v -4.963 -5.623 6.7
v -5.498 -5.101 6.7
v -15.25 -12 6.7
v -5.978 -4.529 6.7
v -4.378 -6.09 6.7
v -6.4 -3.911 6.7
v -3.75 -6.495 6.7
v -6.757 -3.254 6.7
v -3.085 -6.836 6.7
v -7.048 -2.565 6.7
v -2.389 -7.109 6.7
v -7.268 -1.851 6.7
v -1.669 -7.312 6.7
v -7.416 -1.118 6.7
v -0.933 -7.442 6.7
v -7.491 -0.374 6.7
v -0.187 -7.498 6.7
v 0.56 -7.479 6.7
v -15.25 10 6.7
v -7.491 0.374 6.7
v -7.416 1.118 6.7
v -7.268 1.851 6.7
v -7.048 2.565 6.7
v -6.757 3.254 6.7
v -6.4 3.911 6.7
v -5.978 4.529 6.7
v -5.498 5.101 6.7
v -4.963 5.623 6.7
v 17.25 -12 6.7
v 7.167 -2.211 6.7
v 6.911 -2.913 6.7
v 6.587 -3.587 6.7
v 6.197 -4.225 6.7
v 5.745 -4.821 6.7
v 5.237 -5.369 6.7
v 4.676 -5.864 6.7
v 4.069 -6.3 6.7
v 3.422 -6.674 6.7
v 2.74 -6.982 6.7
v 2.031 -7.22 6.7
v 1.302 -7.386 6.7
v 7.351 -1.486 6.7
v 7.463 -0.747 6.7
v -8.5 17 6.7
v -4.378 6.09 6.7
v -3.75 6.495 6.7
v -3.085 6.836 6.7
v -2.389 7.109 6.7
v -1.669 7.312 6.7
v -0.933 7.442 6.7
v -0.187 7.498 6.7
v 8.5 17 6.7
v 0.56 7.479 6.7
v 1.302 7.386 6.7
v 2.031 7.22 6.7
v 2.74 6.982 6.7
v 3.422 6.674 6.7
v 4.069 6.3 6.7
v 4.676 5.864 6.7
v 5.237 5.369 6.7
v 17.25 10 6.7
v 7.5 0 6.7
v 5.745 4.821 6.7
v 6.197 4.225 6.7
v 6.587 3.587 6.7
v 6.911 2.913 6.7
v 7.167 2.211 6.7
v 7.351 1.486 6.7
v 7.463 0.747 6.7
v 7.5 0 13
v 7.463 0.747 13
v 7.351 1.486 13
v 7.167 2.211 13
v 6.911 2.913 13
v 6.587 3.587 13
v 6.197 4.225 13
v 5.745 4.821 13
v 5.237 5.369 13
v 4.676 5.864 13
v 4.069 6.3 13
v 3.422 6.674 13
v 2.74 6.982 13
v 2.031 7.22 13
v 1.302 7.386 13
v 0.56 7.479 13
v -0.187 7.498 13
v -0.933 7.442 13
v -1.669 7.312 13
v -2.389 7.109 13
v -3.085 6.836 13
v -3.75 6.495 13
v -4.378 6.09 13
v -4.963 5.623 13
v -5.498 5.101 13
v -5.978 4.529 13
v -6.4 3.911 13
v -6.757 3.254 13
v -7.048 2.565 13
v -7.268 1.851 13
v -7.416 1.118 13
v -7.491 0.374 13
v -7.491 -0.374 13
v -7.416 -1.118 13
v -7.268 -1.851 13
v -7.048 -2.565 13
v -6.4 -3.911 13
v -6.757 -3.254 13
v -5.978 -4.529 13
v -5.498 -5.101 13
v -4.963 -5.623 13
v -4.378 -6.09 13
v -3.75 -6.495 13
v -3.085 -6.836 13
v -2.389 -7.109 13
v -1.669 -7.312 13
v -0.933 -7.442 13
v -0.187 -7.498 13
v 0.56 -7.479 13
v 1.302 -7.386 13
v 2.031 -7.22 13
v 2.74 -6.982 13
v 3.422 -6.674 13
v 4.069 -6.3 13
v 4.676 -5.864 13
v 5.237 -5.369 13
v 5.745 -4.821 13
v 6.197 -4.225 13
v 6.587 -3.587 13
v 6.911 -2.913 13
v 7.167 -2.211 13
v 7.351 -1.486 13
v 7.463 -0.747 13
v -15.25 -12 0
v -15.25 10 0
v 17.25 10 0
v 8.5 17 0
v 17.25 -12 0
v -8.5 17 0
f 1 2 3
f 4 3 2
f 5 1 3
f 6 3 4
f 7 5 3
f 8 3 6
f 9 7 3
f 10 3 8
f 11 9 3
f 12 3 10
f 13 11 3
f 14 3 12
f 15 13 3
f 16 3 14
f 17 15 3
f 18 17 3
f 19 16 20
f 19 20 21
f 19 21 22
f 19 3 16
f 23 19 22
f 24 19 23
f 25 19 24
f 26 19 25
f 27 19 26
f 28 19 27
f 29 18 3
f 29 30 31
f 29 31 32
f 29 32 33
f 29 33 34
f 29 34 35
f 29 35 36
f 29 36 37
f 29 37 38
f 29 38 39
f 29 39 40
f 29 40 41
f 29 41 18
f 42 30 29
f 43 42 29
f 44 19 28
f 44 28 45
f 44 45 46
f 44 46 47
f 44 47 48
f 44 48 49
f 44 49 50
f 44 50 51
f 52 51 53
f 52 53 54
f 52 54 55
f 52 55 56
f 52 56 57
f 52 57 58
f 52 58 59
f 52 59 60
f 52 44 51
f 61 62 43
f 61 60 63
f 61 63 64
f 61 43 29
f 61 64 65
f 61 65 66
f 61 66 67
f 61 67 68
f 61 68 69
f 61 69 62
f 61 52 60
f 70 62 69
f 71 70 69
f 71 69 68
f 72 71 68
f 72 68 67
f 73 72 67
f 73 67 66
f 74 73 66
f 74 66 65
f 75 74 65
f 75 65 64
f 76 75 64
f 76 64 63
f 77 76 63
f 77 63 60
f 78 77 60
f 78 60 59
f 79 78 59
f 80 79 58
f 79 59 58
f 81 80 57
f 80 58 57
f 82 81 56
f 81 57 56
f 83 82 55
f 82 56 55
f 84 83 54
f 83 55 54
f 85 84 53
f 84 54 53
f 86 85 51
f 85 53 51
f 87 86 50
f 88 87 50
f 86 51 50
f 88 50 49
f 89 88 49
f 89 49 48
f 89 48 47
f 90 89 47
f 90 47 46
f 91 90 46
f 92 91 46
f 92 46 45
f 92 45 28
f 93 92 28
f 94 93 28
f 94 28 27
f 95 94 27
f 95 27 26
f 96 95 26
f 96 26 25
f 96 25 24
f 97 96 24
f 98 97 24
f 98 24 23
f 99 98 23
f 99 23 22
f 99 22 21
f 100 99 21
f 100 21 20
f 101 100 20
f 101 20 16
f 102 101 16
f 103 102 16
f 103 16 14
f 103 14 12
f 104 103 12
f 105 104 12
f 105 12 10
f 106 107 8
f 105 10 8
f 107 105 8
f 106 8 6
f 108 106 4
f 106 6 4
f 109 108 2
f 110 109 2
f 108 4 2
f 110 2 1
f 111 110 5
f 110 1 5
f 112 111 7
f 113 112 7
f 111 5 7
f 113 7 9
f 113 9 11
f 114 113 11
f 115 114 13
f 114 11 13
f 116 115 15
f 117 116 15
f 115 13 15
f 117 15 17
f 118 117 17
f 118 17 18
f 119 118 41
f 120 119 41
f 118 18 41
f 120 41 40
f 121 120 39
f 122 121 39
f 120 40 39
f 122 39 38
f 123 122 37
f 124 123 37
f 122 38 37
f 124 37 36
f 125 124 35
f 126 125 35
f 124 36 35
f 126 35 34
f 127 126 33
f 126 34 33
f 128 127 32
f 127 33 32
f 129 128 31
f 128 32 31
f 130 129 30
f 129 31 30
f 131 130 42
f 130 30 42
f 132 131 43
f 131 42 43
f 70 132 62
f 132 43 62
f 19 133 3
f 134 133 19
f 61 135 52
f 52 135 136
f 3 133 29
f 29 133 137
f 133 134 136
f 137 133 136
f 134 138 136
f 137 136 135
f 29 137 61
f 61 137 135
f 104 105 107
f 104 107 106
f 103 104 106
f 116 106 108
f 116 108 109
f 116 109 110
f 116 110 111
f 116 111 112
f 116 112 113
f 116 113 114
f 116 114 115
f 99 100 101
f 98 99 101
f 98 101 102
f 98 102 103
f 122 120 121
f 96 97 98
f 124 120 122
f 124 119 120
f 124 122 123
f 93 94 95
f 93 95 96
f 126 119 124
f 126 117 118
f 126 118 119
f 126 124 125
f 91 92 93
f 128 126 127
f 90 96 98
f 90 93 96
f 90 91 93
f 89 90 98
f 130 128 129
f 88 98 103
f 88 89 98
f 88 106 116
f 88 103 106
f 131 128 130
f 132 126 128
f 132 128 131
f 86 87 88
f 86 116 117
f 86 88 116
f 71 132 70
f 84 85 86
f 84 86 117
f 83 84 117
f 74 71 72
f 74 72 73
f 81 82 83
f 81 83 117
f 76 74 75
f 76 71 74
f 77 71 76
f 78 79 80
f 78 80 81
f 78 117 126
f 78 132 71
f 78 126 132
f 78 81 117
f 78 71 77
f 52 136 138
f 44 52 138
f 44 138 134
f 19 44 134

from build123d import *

# Parameters (mm, degrees)
F0_W     = 32.5
F0_H     = 22
F1_DEPTH = 6.7
F2_R     = 7.5
F3_DEPTH = 13


with BuildPart() as f1:
    # F0 (on Top) → F1 (new body)
    with BuildSketch(Plane.XY):
        with Locations((1, -1)):
            Rectangle(F0_W, F0_H)
        Polygon((-8.5, 17), (-15.25, 10), (17.25, 10), (8.5, 17), align=None)
    extrude(amount=F1_DEPTH)

    # F2 (on Top) → F3 (join)
    with BuildSketch(Plane.XY):
        Circle(F2_R)
    extrude(amount=F3_DEPTH)


solid = f1.part
